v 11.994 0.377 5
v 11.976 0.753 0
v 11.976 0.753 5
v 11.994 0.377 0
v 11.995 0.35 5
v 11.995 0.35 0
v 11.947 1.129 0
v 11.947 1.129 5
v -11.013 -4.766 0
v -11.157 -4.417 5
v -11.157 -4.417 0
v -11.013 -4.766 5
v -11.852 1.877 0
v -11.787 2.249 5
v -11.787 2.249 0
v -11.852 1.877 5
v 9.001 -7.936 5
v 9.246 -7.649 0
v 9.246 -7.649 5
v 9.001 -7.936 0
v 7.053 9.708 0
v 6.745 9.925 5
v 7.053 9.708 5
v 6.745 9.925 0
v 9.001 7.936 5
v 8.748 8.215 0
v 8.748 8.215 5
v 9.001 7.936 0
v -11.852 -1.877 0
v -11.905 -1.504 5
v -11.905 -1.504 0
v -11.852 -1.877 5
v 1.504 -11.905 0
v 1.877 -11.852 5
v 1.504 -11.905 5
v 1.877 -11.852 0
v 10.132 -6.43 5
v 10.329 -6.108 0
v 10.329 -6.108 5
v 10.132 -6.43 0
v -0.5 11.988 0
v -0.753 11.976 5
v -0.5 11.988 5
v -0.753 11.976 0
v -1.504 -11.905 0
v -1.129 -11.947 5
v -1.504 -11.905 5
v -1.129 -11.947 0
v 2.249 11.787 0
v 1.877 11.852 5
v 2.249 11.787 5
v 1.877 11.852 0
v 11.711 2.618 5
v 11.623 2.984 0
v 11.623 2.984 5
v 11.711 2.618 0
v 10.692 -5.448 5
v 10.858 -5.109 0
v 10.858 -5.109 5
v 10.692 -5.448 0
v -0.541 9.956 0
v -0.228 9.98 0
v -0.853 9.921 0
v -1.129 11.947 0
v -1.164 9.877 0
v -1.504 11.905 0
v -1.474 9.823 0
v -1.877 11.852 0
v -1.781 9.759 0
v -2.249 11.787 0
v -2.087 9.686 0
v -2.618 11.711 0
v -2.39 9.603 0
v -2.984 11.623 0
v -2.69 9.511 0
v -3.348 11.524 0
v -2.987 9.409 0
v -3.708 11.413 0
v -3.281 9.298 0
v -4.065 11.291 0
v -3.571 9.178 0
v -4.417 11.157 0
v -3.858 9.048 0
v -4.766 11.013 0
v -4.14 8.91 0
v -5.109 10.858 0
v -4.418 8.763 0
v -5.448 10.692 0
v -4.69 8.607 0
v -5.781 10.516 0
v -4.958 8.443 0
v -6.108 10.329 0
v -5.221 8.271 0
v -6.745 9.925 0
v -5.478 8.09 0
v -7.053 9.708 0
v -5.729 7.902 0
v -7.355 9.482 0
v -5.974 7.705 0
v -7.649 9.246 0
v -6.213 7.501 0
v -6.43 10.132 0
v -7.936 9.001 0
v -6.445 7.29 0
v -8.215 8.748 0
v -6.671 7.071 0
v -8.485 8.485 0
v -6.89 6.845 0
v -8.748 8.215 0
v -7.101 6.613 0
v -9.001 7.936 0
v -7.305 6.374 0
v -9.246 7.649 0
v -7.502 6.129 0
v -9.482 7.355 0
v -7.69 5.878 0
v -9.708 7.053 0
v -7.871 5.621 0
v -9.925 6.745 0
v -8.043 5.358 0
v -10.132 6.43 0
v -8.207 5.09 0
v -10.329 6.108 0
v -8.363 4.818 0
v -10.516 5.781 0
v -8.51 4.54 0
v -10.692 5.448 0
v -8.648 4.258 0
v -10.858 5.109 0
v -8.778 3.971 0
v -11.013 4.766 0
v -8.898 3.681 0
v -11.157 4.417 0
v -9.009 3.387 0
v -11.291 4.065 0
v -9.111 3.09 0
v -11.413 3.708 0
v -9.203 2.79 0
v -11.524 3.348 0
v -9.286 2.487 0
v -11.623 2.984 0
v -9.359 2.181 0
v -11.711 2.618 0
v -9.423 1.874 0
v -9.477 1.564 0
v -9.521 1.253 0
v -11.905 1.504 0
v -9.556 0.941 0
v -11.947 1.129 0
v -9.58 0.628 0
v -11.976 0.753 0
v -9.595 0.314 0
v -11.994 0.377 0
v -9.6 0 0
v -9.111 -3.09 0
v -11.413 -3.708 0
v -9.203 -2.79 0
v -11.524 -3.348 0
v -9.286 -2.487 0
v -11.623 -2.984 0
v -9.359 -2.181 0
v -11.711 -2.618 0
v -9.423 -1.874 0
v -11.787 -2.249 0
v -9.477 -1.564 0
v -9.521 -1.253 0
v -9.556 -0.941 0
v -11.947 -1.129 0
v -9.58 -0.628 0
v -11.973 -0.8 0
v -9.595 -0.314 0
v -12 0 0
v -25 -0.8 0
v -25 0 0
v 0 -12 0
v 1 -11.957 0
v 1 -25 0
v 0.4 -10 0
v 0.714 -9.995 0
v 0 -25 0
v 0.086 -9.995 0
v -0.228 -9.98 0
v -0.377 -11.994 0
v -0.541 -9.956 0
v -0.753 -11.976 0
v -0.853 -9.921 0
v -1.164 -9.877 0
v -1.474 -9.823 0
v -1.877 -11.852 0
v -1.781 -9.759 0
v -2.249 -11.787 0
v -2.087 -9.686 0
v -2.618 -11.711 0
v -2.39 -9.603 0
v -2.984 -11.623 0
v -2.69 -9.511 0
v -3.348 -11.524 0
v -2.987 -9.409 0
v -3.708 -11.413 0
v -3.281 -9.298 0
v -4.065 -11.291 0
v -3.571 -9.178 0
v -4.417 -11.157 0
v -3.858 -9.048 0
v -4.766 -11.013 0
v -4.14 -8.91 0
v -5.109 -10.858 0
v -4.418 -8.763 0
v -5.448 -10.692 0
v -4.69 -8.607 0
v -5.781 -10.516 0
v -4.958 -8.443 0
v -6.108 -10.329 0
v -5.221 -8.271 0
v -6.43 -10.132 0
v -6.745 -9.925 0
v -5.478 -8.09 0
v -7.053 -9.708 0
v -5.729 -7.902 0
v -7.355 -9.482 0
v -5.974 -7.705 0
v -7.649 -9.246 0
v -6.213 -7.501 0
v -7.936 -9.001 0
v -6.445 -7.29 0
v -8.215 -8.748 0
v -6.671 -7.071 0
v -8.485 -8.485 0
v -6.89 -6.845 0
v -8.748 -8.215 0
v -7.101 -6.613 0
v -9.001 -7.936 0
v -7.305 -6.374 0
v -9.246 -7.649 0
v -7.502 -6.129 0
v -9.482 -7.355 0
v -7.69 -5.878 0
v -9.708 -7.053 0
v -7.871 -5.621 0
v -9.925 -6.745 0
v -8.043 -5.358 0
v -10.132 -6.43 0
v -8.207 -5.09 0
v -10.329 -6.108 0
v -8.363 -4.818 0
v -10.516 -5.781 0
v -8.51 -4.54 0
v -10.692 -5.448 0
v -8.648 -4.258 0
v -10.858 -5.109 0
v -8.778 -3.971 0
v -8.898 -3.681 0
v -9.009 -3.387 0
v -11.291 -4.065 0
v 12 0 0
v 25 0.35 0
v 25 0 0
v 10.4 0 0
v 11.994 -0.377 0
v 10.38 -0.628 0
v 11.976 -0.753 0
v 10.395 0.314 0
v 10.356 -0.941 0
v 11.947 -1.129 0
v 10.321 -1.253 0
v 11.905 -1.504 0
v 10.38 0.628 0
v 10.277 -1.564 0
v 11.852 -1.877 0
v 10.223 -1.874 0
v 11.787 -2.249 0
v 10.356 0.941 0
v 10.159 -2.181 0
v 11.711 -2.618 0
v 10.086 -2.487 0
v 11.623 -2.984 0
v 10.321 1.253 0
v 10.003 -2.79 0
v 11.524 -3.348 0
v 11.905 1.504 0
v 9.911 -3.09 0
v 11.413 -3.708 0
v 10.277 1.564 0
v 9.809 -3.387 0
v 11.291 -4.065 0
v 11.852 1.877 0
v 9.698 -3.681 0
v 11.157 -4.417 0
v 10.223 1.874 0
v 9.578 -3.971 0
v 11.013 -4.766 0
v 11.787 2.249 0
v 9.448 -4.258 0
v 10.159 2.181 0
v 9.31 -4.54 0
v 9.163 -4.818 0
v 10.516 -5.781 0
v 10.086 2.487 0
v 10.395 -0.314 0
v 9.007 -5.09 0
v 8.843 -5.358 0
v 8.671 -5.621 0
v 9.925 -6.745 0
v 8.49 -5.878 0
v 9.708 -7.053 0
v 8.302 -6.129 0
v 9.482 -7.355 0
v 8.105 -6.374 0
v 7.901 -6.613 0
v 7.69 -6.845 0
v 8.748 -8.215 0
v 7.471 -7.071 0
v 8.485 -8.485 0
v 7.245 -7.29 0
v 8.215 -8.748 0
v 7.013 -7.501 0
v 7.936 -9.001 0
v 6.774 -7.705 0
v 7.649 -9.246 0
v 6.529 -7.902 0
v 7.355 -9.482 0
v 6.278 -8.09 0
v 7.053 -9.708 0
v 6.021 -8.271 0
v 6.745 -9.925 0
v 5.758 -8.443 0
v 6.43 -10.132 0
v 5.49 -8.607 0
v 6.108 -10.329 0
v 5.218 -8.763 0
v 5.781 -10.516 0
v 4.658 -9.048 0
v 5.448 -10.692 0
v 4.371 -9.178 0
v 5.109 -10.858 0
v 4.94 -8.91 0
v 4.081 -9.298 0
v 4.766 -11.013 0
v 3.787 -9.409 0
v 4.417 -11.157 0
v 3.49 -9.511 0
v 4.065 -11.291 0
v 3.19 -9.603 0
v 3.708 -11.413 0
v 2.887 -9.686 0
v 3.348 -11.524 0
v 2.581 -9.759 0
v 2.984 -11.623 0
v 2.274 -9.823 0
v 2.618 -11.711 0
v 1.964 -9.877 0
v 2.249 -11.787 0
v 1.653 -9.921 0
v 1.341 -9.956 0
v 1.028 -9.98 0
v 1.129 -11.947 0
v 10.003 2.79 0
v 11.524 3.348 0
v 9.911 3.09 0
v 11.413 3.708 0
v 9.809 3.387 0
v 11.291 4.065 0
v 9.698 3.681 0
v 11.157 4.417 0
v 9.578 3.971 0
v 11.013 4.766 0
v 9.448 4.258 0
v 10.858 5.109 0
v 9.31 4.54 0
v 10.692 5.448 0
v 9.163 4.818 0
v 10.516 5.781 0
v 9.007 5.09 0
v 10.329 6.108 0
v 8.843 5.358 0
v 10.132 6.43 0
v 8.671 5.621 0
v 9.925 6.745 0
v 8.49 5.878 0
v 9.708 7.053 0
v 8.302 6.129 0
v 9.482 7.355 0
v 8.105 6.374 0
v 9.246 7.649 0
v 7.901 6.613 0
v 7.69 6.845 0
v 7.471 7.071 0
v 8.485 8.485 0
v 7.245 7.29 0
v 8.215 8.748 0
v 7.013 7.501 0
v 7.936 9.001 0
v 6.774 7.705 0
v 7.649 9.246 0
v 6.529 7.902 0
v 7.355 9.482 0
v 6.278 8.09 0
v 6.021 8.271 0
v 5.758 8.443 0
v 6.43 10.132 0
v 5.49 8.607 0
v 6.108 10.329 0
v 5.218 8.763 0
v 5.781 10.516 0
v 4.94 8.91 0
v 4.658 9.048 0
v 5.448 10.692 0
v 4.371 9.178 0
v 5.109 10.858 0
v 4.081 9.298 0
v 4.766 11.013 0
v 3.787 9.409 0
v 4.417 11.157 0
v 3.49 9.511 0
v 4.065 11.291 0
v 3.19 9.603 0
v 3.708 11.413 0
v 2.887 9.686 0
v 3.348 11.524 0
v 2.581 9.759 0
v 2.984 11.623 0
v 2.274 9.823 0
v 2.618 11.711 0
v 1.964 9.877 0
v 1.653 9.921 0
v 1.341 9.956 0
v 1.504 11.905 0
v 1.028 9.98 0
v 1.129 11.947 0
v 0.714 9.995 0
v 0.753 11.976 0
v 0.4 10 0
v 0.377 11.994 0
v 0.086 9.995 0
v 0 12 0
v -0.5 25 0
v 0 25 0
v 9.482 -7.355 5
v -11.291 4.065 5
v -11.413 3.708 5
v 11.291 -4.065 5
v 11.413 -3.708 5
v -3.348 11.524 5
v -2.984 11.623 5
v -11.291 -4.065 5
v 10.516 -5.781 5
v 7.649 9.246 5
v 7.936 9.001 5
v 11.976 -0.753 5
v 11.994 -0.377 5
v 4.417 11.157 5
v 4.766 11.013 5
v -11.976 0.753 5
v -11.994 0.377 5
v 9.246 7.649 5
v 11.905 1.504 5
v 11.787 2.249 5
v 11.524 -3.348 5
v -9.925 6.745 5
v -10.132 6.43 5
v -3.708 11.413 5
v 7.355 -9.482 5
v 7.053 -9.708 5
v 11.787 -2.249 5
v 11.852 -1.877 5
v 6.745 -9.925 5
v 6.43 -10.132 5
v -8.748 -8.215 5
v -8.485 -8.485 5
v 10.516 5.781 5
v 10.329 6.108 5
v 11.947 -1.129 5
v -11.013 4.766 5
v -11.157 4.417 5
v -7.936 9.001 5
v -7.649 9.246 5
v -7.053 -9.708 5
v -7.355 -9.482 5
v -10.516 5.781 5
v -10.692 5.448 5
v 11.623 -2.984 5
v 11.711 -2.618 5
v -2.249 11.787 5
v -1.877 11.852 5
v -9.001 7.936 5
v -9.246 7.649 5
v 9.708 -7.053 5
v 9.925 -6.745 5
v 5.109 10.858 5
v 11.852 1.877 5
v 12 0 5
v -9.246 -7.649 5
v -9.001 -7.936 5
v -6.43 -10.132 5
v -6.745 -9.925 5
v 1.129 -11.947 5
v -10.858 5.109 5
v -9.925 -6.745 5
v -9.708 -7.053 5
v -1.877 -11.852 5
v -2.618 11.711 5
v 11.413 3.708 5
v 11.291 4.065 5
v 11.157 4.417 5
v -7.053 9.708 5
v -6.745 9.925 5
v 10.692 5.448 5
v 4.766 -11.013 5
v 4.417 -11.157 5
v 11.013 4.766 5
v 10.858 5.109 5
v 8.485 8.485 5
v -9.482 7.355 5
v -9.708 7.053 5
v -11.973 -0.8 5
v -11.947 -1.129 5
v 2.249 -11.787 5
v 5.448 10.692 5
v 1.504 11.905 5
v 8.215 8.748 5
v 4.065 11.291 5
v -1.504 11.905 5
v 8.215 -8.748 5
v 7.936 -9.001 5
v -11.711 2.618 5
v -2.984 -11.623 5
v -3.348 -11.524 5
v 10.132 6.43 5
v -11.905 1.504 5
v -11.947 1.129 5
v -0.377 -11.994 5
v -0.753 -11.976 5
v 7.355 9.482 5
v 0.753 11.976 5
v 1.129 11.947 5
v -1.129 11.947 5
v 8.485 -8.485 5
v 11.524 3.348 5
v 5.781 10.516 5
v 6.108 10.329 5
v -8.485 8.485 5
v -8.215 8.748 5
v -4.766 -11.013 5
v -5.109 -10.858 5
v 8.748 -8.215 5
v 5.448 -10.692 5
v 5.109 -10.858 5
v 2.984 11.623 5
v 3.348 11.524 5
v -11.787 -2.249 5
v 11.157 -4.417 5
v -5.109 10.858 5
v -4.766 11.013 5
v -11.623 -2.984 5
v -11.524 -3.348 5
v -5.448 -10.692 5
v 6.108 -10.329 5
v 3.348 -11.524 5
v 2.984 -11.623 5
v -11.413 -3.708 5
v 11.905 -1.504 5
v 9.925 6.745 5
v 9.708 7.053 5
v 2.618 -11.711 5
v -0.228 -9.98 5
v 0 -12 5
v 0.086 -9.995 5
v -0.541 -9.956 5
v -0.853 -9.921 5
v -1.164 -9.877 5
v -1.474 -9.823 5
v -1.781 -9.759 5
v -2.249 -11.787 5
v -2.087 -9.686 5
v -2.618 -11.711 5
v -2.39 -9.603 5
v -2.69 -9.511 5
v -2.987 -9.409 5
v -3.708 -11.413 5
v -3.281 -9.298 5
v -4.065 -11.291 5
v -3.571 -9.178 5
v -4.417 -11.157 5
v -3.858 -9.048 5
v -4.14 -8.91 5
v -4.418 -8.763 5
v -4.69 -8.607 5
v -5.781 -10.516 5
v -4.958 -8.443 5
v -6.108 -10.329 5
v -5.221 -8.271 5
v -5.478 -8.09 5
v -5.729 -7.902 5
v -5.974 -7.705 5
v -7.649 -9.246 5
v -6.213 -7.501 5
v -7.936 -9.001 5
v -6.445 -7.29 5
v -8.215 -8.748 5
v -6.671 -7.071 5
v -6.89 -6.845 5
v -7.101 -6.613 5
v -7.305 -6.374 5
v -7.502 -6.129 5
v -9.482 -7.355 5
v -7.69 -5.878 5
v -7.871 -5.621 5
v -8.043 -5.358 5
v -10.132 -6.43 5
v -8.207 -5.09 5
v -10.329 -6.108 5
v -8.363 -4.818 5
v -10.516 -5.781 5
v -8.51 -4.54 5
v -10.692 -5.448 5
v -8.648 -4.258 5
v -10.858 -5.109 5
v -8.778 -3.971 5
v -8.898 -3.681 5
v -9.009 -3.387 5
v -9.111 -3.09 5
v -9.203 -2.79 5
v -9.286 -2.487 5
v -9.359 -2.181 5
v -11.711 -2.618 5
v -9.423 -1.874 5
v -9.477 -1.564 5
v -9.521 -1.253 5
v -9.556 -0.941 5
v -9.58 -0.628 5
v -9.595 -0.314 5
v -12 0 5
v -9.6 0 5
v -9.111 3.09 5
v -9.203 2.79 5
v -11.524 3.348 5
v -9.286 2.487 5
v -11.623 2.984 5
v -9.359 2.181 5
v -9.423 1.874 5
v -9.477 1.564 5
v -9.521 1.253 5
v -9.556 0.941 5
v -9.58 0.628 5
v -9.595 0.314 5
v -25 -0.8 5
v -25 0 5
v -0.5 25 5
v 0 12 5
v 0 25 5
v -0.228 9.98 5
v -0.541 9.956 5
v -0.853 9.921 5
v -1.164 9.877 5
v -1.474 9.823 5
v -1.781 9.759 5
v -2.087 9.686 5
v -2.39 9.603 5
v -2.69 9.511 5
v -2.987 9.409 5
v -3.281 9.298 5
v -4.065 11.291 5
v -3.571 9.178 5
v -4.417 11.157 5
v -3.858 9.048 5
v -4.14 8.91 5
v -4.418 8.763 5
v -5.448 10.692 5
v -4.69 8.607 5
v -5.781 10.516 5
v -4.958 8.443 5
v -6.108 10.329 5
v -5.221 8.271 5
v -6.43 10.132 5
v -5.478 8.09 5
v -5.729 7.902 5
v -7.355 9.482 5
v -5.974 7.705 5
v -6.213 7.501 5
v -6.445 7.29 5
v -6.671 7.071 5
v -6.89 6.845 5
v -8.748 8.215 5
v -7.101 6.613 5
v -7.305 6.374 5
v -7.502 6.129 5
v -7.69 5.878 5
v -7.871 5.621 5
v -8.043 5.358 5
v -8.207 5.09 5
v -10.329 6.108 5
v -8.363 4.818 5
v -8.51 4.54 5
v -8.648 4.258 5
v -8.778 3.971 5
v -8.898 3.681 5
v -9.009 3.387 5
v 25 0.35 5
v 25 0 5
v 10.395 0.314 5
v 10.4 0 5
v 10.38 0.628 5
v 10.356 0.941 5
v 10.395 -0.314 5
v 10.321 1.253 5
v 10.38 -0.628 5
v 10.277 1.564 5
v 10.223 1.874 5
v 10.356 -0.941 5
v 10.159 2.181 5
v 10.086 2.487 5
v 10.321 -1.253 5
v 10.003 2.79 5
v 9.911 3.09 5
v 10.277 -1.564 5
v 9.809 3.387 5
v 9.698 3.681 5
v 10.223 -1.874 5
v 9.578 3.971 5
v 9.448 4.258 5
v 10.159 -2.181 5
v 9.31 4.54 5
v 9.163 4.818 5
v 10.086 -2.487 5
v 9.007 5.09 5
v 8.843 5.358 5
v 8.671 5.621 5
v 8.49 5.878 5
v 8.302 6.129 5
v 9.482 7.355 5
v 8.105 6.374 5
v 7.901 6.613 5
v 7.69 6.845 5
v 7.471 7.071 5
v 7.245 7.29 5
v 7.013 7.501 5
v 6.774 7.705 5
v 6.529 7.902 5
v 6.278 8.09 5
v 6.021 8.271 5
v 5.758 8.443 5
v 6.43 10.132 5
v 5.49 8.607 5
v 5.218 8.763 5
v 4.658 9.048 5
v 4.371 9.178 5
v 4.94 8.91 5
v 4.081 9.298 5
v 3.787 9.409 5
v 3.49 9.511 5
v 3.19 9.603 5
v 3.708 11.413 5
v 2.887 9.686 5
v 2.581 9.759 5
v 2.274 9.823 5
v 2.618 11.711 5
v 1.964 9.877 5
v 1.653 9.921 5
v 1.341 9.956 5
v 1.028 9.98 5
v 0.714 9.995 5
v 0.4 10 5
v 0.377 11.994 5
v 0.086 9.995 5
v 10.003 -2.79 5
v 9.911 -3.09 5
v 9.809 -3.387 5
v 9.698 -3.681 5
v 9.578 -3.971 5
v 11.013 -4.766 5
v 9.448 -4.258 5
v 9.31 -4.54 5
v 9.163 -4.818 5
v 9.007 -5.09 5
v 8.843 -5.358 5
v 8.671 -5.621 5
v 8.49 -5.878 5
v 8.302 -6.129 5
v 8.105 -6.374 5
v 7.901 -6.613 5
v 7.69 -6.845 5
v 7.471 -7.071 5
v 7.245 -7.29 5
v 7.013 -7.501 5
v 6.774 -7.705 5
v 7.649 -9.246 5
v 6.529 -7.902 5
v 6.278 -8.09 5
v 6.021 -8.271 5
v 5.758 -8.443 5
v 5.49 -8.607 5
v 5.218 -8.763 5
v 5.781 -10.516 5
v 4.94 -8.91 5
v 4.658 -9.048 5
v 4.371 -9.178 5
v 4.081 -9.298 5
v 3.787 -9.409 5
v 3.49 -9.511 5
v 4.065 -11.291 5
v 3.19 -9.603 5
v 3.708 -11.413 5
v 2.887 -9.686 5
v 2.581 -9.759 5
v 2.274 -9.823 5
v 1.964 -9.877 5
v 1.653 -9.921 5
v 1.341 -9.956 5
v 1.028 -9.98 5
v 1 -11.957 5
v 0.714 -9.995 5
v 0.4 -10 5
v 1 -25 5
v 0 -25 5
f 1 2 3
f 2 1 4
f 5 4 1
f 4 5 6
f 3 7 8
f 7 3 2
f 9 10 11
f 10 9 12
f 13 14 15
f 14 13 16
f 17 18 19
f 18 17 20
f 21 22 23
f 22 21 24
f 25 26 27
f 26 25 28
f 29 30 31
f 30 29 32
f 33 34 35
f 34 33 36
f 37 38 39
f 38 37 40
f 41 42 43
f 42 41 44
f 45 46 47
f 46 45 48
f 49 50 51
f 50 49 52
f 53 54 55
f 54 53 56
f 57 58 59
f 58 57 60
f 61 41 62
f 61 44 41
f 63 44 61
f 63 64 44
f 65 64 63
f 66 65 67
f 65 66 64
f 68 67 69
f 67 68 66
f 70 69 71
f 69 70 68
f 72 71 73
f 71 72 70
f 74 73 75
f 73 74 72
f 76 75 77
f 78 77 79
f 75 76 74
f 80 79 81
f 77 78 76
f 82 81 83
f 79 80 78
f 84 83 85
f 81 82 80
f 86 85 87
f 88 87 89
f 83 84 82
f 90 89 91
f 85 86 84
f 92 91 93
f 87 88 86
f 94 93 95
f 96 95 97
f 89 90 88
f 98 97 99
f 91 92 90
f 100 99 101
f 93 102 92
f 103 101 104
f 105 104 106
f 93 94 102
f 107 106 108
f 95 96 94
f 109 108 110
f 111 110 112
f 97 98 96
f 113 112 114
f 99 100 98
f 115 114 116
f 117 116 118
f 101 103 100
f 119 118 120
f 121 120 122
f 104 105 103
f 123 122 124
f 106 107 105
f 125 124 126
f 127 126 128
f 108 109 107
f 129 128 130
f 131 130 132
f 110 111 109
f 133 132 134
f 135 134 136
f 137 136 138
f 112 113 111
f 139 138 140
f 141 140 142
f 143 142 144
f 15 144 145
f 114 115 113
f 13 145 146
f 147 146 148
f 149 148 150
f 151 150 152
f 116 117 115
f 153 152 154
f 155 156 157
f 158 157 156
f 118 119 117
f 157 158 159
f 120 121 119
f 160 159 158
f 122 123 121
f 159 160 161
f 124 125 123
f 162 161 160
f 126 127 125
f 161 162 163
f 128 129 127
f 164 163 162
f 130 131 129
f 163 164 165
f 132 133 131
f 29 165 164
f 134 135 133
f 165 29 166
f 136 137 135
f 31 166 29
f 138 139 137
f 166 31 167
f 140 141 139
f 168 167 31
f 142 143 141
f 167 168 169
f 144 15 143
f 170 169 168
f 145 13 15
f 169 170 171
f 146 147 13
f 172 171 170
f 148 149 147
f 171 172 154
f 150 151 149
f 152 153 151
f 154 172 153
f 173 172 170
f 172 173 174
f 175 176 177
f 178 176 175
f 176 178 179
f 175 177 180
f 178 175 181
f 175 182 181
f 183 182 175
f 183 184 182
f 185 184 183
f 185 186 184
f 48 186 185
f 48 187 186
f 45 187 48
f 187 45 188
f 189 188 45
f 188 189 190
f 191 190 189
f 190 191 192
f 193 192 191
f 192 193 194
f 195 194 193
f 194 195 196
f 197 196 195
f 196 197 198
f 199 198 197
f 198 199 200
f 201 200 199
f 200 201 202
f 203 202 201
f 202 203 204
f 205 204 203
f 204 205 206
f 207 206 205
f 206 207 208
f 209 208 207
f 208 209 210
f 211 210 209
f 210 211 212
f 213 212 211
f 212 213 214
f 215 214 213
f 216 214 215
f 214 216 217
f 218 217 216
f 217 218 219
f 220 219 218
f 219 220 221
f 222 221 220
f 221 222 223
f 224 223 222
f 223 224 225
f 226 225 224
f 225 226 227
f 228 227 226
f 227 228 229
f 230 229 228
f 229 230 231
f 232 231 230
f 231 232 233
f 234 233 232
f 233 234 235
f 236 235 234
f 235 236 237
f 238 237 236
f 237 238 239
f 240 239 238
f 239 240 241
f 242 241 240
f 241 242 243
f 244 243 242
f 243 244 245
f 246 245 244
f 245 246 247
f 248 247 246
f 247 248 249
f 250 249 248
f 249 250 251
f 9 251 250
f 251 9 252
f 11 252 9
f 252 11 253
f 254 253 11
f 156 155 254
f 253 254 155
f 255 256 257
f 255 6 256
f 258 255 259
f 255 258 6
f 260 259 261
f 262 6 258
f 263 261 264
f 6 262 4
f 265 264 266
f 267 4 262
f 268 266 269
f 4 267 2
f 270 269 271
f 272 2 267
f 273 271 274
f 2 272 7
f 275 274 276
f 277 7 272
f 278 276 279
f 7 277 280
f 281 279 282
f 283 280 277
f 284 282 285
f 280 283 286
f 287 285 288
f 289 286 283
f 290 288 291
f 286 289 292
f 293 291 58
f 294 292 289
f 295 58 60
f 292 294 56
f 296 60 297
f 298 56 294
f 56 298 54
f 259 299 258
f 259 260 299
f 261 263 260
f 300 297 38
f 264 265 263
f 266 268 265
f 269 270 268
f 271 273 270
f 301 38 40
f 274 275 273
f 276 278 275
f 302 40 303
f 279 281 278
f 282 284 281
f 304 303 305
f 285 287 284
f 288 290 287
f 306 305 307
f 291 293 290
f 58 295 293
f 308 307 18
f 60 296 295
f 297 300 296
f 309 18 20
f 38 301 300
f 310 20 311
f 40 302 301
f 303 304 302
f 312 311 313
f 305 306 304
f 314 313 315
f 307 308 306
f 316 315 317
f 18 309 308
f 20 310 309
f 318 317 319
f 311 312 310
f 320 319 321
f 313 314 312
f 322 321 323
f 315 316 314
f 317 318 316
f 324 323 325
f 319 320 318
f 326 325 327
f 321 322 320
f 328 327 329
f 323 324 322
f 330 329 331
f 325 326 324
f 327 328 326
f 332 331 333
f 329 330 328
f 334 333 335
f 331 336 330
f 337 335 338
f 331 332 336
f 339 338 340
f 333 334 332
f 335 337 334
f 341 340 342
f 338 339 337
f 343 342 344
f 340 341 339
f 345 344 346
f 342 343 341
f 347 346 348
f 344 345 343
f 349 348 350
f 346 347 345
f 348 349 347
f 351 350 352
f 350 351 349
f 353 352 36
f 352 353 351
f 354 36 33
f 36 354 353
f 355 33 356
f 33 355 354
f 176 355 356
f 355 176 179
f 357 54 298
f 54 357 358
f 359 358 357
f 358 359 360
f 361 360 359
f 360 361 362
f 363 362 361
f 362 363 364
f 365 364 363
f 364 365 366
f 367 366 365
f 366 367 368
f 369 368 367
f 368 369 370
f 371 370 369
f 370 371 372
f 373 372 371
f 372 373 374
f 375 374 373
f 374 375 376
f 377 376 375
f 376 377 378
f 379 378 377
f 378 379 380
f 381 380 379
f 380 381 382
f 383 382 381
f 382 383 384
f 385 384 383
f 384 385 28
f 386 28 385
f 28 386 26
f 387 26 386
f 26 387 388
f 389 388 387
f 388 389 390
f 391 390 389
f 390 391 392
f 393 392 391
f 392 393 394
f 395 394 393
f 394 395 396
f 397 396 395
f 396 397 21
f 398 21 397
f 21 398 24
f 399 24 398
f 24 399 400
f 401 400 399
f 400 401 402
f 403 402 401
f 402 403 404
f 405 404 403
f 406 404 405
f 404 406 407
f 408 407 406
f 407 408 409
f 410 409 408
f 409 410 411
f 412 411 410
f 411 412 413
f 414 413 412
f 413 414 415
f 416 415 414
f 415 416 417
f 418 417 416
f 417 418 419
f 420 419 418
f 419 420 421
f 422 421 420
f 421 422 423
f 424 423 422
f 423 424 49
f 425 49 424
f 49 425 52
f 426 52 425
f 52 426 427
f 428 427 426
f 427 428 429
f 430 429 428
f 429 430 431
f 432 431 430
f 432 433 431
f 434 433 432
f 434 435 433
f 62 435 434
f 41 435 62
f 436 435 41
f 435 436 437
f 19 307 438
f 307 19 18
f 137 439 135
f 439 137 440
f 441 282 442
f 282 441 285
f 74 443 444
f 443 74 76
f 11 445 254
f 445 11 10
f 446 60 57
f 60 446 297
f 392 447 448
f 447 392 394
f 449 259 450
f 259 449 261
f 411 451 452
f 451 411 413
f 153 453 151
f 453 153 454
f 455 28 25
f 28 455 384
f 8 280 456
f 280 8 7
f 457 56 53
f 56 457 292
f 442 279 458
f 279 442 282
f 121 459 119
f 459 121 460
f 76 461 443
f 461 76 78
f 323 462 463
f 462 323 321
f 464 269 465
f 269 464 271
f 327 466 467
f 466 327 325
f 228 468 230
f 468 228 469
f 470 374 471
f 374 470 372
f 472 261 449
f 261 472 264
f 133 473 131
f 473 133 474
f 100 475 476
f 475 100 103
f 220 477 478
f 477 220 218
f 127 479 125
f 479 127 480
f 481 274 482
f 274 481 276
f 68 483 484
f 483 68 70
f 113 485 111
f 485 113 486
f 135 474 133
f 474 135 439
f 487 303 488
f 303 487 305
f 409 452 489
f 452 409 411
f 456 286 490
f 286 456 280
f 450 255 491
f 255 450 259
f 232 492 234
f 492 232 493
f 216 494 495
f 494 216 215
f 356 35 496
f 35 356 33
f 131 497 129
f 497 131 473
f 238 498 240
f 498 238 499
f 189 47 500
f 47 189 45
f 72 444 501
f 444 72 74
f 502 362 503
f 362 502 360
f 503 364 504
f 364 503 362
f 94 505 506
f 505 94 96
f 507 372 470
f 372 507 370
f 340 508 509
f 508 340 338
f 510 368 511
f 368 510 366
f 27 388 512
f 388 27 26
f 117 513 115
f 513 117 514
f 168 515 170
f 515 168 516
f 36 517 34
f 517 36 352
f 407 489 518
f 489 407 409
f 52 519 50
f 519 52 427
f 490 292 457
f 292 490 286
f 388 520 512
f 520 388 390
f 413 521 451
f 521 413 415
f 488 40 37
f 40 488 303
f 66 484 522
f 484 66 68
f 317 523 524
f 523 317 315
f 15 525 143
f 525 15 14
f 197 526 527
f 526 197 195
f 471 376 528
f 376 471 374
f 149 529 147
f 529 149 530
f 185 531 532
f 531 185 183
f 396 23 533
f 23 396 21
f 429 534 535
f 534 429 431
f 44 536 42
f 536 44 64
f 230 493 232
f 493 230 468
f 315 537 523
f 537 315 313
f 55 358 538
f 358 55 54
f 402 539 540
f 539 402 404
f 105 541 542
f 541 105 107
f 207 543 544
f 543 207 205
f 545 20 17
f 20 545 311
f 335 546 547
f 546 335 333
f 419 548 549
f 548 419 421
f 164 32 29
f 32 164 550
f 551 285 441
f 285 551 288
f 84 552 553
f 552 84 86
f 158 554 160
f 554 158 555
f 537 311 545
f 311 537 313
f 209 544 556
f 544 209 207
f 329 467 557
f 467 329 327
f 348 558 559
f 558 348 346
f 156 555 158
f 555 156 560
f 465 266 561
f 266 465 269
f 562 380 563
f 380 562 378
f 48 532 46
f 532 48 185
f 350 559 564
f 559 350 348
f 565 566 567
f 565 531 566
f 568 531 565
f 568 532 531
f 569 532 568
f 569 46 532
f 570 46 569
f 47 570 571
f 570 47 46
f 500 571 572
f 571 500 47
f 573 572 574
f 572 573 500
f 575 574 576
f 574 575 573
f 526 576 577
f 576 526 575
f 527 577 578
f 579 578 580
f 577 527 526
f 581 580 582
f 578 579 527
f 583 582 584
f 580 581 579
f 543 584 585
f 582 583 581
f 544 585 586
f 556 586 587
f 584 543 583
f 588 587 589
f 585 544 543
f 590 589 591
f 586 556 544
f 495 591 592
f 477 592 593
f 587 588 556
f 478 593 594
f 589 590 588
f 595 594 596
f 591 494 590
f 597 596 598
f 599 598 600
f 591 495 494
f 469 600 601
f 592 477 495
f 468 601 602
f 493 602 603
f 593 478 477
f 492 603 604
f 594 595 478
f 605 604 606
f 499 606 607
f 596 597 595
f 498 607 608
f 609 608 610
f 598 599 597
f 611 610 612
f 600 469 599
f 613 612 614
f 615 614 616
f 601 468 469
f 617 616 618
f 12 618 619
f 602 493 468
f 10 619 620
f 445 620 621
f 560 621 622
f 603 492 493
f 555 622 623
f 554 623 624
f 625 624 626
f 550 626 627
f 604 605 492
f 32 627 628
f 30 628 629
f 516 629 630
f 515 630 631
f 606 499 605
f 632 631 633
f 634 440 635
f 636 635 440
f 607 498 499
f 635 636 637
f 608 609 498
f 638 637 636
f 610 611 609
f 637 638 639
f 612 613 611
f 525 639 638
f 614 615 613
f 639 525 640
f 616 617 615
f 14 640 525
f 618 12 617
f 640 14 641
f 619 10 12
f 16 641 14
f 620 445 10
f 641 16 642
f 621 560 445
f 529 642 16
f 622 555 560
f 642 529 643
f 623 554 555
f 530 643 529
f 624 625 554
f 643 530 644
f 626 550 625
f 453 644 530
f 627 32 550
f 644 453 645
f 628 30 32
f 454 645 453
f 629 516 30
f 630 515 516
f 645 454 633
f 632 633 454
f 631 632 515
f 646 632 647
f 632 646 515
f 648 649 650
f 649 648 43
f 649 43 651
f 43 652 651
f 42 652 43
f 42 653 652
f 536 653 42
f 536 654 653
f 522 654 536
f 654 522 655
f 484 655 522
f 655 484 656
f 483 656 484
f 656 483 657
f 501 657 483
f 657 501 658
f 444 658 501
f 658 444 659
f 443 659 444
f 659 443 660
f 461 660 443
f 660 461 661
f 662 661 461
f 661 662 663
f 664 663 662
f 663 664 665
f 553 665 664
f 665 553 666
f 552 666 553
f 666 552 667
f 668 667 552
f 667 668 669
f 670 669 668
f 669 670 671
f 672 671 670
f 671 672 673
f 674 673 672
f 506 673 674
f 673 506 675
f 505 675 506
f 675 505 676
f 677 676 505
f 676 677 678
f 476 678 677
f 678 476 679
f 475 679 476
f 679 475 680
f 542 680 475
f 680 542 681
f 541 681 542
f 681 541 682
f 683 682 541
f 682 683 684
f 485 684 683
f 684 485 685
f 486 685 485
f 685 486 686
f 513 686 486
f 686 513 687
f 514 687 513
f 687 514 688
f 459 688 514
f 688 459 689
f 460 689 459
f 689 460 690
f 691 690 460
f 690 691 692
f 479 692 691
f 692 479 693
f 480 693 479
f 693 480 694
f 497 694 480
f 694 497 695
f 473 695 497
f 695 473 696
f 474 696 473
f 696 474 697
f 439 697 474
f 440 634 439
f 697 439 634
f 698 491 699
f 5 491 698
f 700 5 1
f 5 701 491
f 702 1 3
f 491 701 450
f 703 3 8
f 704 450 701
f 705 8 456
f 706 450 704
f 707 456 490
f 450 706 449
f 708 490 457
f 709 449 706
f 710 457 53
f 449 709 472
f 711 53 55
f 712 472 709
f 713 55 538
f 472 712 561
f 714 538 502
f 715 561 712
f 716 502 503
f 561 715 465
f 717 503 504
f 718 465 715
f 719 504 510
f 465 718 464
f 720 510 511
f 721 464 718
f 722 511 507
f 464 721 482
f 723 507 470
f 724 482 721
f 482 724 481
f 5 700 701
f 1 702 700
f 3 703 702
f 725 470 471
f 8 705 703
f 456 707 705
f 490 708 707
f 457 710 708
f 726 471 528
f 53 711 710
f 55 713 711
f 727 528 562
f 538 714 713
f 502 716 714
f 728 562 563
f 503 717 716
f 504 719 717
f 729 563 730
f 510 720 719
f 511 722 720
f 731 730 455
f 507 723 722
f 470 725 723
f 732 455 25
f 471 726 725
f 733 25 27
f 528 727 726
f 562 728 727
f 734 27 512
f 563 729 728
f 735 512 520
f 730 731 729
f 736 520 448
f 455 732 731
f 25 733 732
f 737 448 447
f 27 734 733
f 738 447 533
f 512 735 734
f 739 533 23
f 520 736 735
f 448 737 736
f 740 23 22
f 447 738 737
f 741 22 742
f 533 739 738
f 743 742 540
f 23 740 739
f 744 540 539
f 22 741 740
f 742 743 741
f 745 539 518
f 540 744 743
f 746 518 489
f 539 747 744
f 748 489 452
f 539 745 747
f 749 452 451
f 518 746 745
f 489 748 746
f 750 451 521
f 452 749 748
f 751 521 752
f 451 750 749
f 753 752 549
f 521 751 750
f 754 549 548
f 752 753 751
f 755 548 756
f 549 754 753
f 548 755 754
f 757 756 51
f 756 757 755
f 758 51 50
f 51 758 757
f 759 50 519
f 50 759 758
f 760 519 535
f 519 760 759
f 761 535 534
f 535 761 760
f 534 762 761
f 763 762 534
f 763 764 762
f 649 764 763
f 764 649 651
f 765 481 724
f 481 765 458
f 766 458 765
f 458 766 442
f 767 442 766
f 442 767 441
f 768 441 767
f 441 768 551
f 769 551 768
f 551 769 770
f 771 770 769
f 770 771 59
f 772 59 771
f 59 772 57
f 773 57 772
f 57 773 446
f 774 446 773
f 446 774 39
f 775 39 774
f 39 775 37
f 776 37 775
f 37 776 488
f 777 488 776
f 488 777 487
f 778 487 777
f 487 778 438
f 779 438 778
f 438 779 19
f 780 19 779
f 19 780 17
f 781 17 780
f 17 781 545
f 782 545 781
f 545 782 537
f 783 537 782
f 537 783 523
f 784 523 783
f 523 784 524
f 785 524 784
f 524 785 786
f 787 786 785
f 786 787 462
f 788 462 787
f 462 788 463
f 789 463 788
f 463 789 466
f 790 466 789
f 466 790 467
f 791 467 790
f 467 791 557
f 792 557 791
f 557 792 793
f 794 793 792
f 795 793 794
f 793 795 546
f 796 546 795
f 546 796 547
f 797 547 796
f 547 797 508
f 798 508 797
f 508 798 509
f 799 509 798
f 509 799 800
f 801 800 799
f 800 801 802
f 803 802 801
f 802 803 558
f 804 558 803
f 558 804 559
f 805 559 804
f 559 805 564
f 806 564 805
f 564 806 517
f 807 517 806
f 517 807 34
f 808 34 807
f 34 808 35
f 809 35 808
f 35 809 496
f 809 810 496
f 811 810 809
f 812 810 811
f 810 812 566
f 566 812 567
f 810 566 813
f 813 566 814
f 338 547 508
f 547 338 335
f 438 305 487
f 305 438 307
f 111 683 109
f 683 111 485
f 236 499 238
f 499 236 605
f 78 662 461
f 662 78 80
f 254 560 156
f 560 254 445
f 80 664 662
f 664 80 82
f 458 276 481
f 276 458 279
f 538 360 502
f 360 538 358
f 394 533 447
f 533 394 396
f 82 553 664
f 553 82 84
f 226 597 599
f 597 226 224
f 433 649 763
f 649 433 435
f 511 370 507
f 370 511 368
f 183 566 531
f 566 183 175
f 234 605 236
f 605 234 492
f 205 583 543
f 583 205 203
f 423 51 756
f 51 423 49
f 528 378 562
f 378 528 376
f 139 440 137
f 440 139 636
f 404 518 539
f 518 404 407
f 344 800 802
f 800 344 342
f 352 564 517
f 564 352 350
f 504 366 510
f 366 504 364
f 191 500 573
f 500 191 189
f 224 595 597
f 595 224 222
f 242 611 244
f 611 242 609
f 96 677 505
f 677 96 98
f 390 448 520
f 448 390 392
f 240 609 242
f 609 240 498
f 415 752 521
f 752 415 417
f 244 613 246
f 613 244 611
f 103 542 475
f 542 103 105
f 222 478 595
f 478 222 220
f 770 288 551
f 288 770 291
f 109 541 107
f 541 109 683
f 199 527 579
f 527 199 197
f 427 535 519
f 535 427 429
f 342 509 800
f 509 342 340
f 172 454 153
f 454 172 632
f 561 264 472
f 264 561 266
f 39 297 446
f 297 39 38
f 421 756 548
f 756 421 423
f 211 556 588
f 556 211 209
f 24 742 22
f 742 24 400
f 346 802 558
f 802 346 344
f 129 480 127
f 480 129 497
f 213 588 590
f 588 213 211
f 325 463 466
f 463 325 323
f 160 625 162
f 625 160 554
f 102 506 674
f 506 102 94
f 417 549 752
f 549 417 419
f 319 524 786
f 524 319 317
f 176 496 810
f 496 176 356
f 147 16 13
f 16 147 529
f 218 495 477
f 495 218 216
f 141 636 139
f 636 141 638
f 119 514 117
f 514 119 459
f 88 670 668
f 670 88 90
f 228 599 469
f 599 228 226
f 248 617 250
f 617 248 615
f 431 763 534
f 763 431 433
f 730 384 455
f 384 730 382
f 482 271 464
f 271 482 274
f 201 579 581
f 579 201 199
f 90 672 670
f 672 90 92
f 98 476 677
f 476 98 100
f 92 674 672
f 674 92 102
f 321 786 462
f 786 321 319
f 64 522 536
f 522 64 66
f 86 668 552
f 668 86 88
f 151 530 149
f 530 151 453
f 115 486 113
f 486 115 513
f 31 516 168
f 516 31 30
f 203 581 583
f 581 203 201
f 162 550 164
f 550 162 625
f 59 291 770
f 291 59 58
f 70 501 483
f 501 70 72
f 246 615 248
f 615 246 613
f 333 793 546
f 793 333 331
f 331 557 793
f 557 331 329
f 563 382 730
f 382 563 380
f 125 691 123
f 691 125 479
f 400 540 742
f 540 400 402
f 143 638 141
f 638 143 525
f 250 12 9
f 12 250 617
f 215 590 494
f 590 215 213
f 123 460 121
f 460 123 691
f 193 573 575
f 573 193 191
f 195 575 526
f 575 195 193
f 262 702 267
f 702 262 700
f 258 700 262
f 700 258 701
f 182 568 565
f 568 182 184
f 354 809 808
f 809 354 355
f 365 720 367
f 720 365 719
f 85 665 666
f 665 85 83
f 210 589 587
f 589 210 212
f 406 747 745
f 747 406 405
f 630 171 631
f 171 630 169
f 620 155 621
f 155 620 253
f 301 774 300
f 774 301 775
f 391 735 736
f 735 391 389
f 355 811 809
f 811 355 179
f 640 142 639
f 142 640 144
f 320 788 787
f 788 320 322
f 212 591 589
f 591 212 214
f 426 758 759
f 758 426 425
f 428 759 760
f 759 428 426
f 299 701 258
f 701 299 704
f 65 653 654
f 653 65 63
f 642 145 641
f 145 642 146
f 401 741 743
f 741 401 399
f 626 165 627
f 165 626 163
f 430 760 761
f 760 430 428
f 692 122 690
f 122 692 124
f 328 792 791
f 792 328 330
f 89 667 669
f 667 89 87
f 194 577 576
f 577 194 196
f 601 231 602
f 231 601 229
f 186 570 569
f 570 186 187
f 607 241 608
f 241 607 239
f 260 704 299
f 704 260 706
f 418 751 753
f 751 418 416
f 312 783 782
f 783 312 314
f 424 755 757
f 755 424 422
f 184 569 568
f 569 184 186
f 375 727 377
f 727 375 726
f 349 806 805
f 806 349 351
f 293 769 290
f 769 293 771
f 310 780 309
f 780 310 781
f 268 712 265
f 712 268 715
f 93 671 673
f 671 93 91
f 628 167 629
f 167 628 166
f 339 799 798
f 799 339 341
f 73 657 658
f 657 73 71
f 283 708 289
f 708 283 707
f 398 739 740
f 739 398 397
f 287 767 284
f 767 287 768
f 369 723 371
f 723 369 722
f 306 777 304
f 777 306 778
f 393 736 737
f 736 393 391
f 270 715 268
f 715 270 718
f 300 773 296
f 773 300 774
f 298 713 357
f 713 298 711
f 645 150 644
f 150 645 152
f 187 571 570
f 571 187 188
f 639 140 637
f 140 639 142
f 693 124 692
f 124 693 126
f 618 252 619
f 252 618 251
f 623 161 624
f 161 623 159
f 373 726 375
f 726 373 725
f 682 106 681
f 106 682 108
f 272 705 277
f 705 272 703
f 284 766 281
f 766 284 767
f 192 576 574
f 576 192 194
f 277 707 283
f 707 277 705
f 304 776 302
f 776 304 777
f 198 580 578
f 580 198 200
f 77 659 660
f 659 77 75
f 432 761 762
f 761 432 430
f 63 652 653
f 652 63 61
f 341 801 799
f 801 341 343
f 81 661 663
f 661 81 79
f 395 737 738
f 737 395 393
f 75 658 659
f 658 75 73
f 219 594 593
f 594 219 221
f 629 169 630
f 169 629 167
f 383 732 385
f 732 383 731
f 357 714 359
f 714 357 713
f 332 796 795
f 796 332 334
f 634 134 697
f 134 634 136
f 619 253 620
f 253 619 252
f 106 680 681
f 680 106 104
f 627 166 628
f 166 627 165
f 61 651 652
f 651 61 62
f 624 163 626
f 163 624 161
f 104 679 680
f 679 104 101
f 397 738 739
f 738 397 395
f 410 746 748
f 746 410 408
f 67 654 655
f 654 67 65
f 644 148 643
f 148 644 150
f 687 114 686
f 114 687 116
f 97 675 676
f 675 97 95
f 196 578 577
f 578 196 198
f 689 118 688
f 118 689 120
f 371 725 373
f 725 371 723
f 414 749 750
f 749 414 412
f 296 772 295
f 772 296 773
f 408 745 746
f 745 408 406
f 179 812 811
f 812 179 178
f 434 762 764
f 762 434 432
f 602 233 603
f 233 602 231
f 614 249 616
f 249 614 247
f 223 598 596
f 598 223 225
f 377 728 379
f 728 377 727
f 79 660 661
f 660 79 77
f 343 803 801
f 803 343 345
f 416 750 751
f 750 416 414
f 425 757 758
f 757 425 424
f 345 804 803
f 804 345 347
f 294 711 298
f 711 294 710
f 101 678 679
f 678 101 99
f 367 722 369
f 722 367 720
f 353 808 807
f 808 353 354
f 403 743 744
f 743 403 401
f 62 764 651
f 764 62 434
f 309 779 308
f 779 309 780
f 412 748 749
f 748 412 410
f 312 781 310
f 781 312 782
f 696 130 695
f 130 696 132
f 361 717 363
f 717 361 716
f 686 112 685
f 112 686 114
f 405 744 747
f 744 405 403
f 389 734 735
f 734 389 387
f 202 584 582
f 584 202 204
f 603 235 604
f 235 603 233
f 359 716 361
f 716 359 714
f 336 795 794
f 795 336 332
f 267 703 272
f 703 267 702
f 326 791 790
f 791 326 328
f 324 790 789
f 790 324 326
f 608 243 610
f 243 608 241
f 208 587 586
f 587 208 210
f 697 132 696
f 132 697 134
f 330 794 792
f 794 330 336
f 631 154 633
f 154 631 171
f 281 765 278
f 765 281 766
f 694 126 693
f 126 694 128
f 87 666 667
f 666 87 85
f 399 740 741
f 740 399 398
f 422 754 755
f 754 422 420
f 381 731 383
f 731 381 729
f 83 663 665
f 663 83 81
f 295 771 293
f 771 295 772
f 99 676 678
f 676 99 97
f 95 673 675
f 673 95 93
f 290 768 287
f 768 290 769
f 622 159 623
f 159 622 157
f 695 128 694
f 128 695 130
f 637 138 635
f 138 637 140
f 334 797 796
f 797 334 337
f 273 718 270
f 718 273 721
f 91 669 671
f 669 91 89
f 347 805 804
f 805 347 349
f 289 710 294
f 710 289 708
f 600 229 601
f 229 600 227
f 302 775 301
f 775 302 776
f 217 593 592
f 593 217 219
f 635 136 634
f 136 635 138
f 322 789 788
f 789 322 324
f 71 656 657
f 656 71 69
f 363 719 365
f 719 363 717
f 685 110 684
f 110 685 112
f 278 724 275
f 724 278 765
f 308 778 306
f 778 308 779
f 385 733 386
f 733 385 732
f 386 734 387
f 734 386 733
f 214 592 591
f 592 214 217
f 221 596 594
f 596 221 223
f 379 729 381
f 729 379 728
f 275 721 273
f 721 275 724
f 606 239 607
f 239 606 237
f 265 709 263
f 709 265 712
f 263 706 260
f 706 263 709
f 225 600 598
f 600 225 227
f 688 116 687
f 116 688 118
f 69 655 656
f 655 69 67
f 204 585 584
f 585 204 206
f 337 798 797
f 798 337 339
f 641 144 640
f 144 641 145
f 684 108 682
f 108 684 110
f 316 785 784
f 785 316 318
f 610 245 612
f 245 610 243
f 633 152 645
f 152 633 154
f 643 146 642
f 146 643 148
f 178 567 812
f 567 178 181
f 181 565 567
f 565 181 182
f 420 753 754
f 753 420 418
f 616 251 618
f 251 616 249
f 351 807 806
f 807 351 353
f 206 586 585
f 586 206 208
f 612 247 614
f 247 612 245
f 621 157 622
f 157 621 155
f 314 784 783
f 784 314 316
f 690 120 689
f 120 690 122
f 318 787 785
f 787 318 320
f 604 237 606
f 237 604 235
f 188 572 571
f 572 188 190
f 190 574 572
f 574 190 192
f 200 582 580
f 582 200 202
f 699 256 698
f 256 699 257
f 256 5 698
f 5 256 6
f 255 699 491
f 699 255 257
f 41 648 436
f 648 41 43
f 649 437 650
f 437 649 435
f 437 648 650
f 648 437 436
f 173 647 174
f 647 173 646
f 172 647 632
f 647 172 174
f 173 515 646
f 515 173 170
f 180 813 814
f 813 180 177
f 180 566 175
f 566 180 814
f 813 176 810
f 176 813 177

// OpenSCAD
// 5@xes Thin Part Test 2020
// Modification for Cura 5.0 test 2022
// Thichness 
//   - 0.35
//   - 0.5
//   - 0.8
//   - 1

$fn=200;

union () {
    translate([11,0,0]) cube([14,0.35,5], center = false);
    translate([0,11,0]) rotate(90, [0,0,1]) cube([14,0.5,5], center = false);
    translate([-11,0,0]) rotate(180, [0,0,1]) cube([14,0.8,5], center = false);
    translate([0,-11,0]) rotate(-90, [0,0,1]) cube([14,1,5], center = false);
    difference() {
        cylinder(r=12, h=5);
        translate([0.4,0,-1]) cylinder(r=10, h=10);
    }
}
